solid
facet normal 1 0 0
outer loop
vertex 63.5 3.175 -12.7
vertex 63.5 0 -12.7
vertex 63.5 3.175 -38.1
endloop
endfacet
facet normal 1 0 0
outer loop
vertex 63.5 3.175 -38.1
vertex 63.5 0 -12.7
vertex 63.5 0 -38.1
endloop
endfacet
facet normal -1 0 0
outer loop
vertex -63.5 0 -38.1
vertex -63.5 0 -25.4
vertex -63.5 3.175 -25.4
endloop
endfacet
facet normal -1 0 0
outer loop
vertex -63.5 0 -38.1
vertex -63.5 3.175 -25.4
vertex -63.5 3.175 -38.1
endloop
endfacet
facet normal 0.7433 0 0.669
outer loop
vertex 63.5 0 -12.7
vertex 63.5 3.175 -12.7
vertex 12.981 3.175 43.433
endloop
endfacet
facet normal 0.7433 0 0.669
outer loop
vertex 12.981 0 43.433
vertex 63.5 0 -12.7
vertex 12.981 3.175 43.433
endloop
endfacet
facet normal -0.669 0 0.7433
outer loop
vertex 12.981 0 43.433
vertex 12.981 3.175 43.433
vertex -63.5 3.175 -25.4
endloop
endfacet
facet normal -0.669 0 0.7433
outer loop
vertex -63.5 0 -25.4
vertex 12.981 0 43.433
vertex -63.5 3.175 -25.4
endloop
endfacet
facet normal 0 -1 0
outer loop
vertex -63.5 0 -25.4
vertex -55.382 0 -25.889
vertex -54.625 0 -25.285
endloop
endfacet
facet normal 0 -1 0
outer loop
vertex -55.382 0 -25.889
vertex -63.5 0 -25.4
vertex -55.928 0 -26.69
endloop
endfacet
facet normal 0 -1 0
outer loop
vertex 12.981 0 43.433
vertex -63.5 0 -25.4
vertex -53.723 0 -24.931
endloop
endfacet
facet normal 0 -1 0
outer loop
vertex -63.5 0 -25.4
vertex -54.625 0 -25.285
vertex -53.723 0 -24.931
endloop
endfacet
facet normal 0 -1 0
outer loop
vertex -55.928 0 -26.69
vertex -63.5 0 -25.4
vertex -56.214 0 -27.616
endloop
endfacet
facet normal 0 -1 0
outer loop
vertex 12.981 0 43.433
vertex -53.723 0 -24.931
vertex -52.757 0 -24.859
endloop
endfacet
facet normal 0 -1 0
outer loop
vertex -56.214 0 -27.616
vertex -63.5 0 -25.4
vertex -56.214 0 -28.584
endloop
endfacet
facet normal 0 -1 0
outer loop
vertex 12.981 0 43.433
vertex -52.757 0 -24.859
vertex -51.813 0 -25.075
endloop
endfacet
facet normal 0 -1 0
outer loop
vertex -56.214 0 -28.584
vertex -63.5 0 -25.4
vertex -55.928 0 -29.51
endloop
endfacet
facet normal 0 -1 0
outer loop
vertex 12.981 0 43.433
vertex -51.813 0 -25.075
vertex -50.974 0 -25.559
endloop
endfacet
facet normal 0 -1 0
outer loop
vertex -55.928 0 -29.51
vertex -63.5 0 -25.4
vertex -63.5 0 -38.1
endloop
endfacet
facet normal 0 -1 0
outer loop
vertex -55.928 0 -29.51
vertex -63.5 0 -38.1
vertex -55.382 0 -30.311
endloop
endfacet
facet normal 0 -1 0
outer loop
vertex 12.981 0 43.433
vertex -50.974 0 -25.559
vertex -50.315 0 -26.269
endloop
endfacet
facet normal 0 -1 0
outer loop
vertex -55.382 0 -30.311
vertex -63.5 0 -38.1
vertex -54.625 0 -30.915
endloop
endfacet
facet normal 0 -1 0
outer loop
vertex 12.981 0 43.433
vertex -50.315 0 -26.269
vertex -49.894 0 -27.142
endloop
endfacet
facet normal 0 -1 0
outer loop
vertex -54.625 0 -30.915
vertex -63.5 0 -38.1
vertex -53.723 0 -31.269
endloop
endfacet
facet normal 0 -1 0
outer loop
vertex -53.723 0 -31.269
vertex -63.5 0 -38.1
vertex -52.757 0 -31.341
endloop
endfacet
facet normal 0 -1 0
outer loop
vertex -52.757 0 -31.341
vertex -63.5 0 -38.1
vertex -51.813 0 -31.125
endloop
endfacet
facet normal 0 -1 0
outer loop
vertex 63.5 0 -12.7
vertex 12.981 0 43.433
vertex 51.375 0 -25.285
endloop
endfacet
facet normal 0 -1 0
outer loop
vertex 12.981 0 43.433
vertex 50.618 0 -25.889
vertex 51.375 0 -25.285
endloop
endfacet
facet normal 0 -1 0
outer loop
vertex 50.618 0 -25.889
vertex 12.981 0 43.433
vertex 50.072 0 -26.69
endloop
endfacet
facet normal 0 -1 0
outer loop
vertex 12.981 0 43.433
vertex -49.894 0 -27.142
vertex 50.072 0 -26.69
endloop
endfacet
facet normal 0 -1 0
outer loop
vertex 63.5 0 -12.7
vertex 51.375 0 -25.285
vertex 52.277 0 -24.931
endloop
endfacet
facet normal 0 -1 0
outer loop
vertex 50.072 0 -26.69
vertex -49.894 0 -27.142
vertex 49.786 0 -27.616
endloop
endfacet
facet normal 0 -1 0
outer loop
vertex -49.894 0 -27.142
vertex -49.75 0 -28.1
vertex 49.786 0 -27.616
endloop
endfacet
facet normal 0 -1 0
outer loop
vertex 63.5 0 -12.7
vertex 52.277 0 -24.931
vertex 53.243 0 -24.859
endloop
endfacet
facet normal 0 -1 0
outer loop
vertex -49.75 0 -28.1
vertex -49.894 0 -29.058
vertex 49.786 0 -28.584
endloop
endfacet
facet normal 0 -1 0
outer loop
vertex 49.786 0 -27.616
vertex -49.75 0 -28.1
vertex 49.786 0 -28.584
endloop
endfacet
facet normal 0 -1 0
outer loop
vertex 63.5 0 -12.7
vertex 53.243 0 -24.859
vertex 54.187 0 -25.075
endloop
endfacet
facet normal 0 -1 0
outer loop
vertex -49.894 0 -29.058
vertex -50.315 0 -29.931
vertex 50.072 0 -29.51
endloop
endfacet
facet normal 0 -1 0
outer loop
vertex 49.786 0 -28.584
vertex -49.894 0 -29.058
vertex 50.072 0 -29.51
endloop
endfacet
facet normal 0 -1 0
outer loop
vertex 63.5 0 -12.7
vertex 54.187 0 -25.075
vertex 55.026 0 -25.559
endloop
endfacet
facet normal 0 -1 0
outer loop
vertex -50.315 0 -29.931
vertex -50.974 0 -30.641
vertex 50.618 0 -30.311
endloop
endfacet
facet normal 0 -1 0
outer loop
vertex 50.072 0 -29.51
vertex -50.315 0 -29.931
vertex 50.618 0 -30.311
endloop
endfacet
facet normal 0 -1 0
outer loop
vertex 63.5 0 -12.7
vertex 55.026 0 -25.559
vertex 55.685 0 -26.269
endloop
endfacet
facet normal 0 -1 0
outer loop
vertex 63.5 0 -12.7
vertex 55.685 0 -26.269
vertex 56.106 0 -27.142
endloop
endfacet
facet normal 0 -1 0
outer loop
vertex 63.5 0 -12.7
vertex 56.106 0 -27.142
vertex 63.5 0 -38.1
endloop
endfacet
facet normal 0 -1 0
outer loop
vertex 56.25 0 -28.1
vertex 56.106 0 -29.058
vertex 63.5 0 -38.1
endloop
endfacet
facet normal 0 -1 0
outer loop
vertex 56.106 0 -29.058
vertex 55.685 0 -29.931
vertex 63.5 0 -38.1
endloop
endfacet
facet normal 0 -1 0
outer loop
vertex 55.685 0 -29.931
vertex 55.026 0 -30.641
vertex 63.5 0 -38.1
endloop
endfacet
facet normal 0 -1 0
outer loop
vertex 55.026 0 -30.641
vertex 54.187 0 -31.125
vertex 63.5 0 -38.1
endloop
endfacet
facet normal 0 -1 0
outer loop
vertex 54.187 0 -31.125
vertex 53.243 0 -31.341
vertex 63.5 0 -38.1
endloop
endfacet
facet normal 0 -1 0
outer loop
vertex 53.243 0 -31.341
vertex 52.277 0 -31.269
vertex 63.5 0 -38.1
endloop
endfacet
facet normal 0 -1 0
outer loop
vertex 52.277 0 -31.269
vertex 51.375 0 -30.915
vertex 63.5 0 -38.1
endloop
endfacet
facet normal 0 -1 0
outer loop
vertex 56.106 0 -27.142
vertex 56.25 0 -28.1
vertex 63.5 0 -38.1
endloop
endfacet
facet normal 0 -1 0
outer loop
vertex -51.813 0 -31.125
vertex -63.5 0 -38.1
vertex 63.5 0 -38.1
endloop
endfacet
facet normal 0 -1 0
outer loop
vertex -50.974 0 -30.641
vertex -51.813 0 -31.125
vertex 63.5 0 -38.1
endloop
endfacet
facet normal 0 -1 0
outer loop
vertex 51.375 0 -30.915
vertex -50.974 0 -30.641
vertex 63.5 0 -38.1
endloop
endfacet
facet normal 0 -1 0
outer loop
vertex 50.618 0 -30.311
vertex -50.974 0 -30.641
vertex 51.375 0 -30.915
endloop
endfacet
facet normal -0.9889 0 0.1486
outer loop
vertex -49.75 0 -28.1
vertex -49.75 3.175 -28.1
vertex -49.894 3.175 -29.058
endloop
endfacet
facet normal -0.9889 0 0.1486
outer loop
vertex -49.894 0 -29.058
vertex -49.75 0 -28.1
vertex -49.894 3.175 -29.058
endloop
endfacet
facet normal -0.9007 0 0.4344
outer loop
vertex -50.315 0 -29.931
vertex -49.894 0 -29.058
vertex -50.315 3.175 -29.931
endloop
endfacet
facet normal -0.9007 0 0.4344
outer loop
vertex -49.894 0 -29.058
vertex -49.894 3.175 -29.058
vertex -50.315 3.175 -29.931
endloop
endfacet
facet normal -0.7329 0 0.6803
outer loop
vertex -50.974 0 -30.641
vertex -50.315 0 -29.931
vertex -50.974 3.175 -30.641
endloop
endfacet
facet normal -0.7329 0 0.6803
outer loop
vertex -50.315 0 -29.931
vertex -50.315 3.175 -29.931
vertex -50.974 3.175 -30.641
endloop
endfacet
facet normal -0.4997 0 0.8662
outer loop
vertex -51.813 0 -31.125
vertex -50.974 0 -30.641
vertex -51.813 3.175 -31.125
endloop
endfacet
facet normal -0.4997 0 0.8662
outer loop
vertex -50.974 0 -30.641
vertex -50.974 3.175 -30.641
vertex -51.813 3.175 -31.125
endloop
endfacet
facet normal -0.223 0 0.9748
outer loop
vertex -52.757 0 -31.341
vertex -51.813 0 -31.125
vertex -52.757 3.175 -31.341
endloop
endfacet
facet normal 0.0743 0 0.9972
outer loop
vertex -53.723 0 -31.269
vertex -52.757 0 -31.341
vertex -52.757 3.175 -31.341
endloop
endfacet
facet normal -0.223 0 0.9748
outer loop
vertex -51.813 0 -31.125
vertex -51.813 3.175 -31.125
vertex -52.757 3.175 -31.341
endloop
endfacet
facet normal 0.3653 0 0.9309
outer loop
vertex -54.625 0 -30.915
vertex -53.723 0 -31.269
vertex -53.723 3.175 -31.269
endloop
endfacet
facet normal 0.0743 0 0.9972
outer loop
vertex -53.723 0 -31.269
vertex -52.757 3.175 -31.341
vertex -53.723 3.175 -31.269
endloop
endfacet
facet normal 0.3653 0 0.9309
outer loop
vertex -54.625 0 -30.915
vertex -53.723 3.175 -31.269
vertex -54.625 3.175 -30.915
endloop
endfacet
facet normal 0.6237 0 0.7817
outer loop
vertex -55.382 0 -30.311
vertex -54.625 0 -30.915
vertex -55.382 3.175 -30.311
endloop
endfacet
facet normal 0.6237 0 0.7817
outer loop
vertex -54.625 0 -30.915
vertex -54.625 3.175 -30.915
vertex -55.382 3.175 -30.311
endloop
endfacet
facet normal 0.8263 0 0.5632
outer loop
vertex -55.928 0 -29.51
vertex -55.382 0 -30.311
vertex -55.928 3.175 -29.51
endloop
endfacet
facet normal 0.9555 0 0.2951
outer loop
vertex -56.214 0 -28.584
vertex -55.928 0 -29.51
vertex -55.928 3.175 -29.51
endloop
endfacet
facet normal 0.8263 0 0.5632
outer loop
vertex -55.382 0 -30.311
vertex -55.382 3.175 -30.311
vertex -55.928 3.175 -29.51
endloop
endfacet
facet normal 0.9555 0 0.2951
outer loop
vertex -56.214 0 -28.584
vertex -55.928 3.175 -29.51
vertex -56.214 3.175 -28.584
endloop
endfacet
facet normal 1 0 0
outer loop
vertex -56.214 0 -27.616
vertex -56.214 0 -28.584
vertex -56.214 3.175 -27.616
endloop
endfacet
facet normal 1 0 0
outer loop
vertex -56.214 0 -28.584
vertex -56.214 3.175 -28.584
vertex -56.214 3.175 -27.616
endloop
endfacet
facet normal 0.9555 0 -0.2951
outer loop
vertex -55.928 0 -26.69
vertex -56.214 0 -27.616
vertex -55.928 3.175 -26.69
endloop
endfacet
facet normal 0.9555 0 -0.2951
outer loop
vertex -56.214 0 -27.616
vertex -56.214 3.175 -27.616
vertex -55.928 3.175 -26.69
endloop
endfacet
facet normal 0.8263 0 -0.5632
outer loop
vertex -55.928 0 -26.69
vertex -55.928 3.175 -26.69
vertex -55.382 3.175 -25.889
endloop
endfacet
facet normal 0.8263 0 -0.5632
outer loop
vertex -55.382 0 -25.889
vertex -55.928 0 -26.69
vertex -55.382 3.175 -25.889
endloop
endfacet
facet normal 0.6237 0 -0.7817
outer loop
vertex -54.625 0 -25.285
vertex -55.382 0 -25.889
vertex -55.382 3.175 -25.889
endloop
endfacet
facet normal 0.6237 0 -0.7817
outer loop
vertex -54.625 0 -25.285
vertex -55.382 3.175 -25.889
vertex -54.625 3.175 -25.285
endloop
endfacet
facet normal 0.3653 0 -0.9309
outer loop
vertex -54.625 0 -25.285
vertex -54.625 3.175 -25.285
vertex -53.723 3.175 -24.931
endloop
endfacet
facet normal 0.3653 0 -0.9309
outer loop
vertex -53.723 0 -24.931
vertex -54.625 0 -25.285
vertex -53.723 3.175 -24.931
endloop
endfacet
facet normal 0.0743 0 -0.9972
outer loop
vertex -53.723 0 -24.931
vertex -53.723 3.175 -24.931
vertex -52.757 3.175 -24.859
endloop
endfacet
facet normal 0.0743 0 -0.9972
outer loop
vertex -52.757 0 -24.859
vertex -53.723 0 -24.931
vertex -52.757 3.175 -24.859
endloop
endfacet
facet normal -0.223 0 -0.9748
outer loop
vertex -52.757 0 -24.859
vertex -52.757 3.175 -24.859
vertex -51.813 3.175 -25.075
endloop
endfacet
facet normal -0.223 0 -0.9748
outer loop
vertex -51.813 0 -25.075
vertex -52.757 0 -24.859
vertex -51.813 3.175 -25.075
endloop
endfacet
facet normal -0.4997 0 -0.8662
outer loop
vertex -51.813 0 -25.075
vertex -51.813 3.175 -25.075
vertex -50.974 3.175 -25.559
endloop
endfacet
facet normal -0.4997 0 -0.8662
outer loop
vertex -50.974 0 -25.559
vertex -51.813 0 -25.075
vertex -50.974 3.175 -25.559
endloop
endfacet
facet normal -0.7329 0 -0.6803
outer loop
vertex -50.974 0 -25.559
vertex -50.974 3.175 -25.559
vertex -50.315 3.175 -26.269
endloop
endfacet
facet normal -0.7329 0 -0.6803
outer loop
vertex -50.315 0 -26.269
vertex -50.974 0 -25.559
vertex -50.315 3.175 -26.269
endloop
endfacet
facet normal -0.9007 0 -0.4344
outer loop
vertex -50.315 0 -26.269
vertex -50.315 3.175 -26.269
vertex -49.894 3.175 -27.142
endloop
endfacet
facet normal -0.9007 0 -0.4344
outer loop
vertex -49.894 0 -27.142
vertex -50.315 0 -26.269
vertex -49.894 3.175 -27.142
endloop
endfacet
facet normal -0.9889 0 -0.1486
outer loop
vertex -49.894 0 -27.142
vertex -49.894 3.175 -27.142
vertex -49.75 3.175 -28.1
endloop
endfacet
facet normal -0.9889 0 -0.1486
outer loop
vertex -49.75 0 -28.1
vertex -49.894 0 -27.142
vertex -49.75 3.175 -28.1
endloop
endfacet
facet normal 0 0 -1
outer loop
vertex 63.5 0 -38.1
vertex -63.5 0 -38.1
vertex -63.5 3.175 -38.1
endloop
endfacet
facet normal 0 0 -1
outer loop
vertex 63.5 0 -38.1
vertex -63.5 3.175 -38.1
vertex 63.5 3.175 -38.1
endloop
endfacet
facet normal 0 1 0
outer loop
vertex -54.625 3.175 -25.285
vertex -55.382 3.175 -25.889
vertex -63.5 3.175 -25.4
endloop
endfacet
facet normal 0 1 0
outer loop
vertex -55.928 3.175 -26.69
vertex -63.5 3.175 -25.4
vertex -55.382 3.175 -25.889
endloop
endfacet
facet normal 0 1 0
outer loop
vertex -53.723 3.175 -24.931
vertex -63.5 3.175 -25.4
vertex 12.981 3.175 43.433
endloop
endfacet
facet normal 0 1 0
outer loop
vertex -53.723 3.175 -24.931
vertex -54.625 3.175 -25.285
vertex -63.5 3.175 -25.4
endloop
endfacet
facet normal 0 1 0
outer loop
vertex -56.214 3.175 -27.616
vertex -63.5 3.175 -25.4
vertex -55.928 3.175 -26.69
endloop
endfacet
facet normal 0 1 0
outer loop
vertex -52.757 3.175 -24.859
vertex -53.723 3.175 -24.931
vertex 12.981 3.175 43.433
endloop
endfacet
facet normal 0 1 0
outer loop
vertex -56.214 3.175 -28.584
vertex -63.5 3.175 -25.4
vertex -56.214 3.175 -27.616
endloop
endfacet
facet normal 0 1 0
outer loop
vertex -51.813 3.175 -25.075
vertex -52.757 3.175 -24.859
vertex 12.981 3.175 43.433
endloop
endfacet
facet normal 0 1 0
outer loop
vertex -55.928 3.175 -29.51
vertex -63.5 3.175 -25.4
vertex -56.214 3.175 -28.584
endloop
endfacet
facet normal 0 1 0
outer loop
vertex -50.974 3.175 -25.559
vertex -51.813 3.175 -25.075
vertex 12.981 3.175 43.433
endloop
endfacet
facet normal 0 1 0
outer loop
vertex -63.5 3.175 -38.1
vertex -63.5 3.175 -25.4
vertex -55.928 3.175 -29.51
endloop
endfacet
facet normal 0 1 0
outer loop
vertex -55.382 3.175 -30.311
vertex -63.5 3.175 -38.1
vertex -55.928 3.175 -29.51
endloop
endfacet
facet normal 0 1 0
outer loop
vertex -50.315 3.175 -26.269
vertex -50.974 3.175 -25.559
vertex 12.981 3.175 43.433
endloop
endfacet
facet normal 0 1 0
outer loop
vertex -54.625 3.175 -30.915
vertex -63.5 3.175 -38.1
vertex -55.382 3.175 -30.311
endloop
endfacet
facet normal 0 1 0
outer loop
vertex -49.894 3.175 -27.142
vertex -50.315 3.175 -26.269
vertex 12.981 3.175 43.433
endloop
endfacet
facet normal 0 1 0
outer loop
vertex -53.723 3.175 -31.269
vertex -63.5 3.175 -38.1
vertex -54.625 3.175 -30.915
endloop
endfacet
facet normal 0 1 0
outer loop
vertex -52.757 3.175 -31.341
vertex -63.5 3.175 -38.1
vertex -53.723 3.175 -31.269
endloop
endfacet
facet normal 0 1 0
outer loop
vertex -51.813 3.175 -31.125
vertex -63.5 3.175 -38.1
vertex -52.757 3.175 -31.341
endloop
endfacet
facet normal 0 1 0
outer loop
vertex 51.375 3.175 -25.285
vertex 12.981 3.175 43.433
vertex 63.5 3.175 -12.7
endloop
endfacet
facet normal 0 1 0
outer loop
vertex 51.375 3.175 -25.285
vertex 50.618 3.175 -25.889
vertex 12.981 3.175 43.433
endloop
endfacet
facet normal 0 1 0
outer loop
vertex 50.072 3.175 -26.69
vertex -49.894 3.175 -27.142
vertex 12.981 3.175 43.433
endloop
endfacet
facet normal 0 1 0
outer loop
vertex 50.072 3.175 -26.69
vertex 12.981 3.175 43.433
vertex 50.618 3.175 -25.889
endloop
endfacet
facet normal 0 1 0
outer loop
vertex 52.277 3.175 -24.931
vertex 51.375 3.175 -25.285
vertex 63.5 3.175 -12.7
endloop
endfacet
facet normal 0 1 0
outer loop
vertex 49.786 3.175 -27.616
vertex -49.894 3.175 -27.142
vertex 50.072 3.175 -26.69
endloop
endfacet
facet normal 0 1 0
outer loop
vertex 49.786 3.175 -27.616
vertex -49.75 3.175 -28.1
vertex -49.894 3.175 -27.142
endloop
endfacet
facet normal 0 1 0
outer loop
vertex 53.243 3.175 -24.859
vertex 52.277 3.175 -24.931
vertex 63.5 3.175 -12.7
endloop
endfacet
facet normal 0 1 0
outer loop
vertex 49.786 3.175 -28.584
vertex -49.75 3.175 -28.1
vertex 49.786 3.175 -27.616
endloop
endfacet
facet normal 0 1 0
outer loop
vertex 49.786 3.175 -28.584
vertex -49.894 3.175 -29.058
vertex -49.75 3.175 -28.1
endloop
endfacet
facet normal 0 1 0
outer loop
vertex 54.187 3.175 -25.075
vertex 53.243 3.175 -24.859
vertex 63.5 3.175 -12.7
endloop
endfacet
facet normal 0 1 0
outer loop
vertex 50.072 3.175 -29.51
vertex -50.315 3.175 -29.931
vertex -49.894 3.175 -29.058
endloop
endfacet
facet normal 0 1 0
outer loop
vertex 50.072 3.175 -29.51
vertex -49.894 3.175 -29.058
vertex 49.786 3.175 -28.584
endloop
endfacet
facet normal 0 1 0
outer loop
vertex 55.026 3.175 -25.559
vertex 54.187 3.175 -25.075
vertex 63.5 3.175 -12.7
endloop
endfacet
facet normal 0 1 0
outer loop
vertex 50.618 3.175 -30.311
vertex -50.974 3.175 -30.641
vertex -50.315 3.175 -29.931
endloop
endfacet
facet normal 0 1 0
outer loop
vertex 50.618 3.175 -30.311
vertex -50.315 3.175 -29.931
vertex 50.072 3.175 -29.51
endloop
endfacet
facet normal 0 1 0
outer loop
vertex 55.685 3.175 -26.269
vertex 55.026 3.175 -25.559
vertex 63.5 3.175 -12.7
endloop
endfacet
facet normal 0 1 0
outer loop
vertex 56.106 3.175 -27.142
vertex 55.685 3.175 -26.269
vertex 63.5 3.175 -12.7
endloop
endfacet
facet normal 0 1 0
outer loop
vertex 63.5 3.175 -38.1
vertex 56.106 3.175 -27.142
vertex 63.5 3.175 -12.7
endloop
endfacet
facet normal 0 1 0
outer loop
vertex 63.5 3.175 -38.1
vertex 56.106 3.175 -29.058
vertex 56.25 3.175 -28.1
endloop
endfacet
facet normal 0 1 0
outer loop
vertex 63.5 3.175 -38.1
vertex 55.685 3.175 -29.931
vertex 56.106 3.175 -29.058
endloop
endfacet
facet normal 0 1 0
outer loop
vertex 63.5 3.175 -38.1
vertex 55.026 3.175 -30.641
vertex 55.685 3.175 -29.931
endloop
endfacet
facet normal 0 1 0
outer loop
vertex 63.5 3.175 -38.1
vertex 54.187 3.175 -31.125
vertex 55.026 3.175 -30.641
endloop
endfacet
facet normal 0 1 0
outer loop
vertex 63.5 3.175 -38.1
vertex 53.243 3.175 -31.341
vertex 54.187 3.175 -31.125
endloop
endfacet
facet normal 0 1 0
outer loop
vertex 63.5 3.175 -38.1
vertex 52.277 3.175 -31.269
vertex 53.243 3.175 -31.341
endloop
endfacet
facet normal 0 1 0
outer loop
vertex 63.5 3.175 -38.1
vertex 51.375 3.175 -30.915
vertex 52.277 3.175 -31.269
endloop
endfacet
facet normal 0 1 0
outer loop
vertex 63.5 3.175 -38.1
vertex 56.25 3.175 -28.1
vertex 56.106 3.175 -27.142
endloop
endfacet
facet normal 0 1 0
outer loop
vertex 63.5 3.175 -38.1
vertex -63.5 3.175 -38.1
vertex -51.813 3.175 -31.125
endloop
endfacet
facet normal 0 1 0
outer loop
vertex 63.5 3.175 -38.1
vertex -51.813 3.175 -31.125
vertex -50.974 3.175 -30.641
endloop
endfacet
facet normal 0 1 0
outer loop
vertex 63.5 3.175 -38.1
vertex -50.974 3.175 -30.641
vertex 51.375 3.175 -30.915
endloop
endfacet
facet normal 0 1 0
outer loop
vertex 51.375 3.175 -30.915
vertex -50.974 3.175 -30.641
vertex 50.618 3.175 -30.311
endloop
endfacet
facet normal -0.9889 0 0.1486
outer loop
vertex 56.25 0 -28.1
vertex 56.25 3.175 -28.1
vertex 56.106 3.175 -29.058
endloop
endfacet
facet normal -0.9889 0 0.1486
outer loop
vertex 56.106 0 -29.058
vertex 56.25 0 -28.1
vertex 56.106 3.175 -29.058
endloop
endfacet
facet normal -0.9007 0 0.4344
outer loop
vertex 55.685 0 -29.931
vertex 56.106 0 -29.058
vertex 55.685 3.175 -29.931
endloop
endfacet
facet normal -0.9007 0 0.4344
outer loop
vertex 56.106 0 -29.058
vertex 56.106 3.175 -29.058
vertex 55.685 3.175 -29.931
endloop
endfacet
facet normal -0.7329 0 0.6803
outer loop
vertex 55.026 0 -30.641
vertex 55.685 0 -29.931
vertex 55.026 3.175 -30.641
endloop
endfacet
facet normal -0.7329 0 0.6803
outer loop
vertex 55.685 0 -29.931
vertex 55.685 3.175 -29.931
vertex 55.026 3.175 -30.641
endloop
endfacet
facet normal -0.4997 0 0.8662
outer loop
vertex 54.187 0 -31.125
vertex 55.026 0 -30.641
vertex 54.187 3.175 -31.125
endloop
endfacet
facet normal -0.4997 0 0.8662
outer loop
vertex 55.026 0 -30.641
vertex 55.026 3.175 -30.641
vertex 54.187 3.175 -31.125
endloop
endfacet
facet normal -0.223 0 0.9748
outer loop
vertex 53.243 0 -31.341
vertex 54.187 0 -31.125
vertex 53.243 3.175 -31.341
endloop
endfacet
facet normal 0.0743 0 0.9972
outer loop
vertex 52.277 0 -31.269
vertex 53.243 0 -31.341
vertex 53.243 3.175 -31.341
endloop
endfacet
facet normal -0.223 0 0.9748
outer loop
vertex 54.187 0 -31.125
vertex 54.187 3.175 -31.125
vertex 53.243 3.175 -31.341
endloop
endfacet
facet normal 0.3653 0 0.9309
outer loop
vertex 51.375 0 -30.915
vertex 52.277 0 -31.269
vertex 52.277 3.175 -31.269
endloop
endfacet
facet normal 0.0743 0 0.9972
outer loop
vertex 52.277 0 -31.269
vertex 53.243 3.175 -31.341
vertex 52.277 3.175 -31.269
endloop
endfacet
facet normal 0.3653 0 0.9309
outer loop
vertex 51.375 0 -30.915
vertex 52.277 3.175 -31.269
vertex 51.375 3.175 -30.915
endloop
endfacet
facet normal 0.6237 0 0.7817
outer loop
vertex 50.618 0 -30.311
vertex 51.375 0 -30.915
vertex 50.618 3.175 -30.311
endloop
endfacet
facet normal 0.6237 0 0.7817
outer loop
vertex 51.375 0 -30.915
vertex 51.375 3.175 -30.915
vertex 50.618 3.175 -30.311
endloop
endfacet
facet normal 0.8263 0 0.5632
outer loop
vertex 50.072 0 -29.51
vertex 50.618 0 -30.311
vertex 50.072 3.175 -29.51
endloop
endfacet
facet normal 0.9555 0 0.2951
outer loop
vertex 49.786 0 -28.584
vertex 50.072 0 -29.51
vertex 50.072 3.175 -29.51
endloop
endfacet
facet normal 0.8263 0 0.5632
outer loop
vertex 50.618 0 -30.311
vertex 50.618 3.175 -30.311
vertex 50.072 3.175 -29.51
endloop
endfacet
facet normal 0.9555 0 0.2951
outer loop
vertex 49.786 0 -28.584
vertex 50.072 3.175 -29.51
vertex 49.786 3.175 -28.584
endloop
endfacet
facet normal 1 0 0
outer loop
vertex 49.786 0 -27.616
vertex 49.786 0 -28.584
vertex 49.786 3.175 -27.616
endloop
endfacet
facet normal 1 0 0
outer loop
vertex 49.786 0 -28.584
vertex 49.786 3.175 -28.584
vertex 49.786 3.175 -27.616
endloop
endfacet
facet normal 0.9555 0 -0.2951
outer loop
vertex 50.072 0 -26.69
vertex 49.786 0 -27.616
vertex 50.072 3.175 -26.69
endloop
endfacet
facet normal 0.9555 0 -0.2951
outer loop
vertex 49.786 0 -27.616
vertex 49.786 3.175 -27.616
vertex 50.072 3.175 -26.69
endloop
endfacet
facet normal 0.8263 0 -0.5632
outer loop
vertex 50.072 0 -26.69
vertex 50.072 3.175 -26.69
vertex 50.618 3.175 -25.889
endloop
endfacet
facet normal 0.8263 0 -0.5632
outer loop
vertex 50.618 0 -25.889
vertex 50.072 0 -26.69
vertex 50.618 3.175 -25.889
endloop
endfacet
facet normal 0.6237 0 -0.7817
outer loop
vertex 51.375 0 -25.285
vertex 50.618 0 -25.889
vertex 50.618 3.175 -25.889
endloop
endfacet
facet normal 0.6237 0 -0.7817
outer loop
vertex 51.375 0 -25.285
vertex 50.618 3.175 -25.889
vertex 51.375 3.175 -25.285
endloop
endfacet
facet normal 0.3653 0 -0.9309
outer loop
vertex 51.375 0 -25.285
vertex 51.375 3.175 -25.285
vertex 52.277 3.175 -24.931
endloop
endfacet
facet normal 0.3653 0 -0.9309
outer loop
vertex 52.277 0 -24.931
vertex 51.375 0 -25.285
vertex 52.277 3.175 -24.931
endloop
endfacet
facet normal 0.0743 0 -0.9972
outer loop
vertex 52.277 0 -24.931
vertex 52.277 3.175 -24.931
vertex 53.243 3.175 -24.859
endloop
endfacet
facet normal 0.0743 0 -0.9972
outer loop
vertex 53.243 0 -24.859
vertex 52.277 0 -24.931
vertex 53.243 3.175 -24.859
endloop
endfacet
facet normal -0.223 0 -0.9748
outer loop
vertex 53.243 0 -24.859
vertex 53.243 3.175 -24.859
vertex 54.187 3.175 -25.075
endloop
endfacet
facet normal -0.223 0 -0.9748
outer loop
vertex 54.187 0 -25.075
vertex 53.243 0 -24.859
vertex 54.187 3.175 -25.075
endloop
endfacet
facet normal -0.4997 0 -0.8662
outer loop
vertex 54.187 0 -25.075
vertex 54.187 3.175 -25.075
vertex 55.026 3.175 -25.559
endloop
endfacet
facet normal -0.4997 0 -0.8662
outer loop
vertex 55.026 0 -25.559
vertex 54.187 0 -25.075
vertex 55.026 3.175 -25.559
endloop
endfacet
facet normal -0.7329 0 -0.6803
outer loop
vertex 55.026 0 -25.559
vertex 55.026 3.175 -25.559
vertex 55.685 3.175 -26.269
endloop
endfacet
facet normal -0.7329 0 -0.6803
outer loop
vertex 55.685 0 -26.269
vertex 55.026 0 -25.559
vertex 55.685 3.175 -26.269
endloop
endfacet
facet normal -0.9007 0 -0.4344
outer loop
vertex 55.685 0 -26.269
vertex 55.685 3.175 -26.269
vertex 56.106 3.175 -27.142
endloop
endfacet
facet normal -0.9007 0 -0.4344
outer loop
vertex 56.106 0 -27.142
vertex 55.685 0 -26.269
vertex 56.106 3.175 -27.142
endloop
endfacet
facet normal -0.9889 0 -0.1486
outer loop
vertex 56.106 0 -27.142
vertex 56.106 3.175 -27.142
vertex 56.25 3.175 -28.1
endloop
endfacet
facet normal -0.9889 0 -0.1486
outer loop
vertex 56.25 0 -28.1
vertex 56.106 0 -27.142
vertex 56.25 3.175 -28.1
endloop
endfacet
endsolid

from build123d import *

# Parameters (mm, degrees)
SKETCH1_W           = 127
SKETCH1_H           = 127
BOSS_EXTRUDE1_DEPTH = 3.175
SKETCH2_R           = 3.25
CUT_EXTRUDE1_DEPTH  = 4.175


with BuildPart() as part:
    # Sketch1 → Boss-Extrude1 (new body)
    with BuildSketch(Plane(origin=(0, 0, 0), x_dir=(1, 0, 0), z_dir=(0, 1, 0))):
        with Locations((0, -25.4)):
            Rectangle(SKETCH1_W, SKETCH1_H)
    extrude(amount=BOSS_EXTRUDE1_DEPTH)

    # Sketch2 → Cut-Extrude1 (cut, through all)
    with BuildSketch(Plane(origin=(0, 3.175, 0), x_dir=(1, 0, 0), z_dir=(0, 1, 0))):
        Polygon((12.980662983, -43.432596685), (-63.5, 25.4), (-63.5, -88.9), (63.5, -88.9), (63.5, 12.7), align=None)
        with Locations((53, 28.1)):
            Circle(SKETCH2_R)
        with Locations((-53, 28.1)):
            Circle(SKETCH2_R)
    extrude(amount=-CUT_EXTRUDE1_DEPTH, mode=Mode.SUBTRACT)


solid = part.part
